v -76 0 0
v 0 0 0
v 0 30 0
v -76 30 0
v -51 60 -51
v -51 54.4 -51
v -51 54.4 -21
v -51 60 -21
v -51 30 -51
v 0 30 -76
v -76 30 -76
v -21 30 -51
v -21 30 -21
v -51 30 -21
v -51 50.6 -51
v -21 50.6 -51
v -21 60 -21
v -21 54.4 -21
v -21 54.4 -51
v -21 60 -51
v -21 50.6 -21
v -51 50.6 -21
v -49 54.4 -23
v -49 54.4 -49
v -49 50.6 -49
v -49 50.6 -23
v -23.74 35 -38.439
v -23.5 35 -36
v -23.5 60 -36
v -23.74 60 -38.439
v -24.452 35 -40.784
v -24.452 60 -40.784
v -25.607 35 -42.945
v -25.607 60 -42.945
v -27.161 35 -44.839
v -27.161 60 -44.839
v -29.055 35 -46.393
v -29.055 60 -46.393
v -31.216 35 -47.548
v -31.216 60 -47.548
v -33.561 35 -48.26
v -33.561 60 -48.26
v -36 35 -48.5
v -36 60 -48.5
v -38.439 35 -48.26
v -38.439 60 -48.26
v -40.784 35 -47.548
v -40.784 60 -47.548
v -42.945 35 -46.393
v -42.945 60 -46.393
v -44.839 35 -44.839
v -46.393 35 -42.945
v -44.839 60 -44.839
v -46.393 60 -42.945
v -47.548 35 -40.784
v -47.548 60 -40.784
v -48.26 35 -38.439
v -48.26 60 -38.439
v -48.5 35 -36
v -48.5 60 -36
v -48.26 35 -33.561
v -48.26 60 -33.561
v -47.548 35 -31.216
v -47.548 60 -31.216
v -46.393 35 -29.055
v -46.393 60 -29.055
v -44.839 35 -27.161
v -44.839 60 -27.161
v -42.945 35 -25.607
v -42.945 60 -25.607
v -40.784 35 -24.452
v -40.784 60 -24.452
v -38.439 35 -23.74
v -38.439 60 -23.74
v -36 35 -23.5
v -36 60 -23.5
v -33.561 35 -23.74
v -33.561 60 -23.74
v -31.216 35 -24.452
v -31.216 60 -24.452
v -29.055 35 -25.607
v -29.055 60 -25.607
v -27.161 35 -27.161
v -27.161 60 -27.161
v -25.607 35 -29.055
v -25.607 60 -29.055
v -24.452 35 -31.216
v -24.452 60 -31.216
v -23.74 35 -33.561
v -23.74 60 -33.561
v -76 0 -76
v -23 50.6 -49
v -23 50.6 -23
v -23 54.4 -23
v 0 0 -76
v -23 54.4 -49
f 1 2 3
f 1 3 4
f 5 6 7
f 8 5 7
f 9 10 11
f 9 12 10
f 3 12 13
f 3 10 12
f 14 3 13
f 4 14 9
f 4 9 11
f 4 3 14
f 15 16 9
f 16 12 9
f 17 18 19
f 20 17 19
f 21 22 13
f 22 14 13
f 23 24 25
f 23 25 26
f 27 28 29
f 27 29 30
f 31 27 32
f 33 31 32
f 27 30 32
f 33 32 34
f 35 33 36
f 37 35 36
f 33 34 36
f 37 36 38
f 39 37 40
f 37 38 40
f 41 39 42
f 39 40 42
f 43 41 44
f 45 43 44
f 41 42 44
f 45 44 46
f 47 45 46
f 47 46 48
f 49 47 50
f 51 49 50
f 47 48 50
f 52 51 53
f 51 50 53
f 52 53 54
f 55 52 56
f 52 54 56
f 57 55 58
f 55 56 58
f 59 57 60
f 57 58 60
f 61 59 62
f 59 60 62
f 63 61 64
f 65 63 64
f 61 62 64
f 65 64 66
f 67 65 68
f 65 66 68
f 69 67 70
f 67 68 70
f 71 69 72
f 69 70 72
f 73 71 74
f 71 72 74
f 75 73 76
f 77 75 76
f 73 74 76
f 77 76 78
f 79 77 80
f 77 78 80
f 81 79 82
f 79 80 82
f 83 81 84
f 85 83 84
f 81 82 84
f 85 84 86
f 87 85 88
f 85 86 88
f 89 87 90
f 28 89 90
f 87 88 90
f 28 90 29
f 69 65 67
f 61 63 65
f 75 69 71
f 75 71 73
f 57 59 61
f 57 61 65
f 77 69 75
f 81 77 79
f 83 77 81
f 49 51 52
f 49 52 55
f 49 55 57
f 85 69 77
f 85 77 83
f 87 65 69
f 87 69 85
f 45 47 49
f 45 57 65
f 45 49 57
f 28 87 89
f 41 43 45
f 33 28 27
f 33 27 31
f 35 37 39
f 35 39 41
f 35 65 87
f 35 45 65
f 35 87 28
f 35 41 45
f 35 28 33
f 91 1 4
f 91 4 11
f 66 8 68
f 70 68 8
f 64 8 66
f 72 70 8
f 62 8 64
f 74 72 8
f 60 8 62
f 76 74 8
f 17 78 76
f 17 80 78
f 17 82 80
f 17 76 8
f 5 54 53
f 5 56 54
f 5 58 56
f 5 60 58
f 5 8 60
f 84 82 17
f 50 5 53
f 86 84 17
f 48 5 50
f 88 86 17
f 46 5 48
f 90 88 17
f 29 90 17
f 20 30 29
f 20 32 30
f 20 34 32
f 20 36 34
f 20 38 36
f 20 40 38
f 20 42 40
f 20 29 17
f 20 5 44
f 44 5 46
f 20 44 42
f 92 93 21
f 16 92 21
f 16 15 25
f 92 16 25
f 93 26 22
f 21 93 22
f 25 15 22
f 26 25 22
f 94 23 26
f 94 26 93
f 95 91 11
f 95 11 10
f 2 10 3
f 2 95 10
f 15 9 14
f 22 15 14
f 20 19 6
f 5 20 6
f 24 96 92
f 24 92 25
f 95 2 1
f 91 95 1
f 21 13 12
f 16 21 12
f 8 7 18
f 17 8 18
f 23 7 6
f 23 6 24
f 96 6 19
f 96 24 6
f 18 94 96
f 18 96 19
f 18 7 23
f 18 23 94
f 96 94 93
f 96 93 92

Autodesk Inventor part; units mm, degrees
ref_plane "YZ Plane" through (0, 0, 0) normal (1, 0, 0) x (0, 1, 0)
ref_plane "XZ Plane" through (0, 0, 0) normal (0, 1, 0) x (-1, 0, 0)
ref_plane "XY Plane" through (0, 0, 0) normal (0, 0, 1) x (1, 0, 0)
sketch "Sketch1" plane through (0, 0, 0) normal (0, 1, 0) x (-1, 0, 0)
  line L0 (0, 0) -> (76, 0)
  line L1 (76, 0) -> (76, -76)
  line L2 (76, -76) -> (0, -76)
  line L3 (0, -76) -> (0, 0)
  dimension "d0" = 76
  dimension "d1" = 76
extrude "Extrusion1" add sketch "Sketch1" along normal blind 30
sketch "Sketch2" plane through (0, 30, 0) normal (0, 1, 0) x (1, 0, 0)
  point P0 (0, 0)
sketch "Sketch3" plane through (0, 30, 0) normal (0, 1, 0) x (1, 0, 0)
  line L0 (-51, 21) -> (-21, 21)
  line L1 (-21, 21) -> (-21, 51)
  line L2 (-21, 51) -> (-51, 51)
  line L3 (-51, 51) -> (-51, 21)
  point P0 (0, 0)
  dimension "d4" = 30
  dimension "d5" = 30
extrude "Extrusion2" add sketch "Sketch3" along normal blind 30
sketch "Sketch4" plane through (-21, 30, -21) normal (1, 0, 0) x (0, 0, -1)
  line L0 (30, 0) -> (30, 30) projected
  line L1 (0, 20.6) -> (30, 20.6)
  line L2 (30, 20.6) -> (30, 24.4)
  line L3 (30, 24.4) -> (0, 24.4)
  line L4 (0, 24.4) -> (0, 20.6)
  point P0 (-21, -30)
  point P1 (0, 22.5)
  point P2 (30, 22.5)
  dimension "d8" = 3.8
sketch "Sketch5" plane through (-21, 30, -51) normal (0, 0, -1) x (-1, 0, 0)
  line L0 (30, 0) -> (30, 30) projected
  line L1 (0, 20.6) -> (30, 20.6)
  line L2 (30, 20.6) -> (30, 24.4)
  line L3 (30, 24.4) -> (0, 24.4)
  line L4 (0, 24.4) -> (0, 20.6)
  line L5 (0, 20.6) -> (30, 24.4) construction
  line L6 (30, 20.6) -> (0, 24.4) construction
  point P0 (-21, -30)
  point P1 (30, 22.5)
  point P2 (15, 22.5)
  dimension "d9" = 3.8
sketch "Sketch6" plane through (-51, 30, -51) normal (-1, 0, 0) x (0, 0, 1)
  line L0 (30, 0) -> (30, 30) projected
  line L1 (0, 20.6) -> (30, 20.6)
  line L2 (30, 20.6) -> (30, 24.4)
  line L3 (30, 24.4) -> (0, 24.4)
  line L4 (0, 24.4) -> (0, 20.6)
  line L5 (0, 20.6) -> (30, 24.4) construction
  line L6 (30, 20.6) -> (0, 24.4) construction
  point P0 (51, -30)
  point P1 (15, 22.5)
  dimension "d10" = 3.8
sketch "Sketch7" plane through (-51, 30, -21) normal (0, 0, 1) x (1, 0, 0)
  line L0 (30, 0) -> (30, 30) projected
  line L1 (0, 24.4) -> (30, 24.4)
  line L2 (30, 24.4) -> (30, 20.6)
  line L3 (30, 20.6) -> (0, 20.6)
  line L4 (0, 20.6) -> (0, 24.4)
  line L5 (0, 24.4) -> (30, 20.6) construction
  line L6 (30, 24.4) -> (0, 20.6) construction
  point P0 (51, -30)
  point P1 (15, 22.5)
  dimension "d11" = 3.8
extrude "Extrusion3" cut sketch "Sketch6" against normal blind 2
extrude "Extrusion4" cut sketch "Sketch7" against normal blind 2
extrude "Extrusion5" cut sketch "Sketch4" against normal blind 2
extrude "Extrusion6" cut sketch "Sketch5" against normal blind 2
sketch "Sketch8" plane through (0, 60, 0) normal (0, 1, 0) x (1, 0, 0)
  line L0 (-21, 21) -> (-51, 21) projected
  line L1 (-21, 51) -> (-21, 21) projected
  circle A0 centre (-36, 36) radius 12.5
  point P0 (0, 0)
  dimension "d20" = 25
extrude "Extrusion7" cut sketch "Sketch8" against normal blind 25
properties part number "Hydraulic cylinder part 1.dwg"
